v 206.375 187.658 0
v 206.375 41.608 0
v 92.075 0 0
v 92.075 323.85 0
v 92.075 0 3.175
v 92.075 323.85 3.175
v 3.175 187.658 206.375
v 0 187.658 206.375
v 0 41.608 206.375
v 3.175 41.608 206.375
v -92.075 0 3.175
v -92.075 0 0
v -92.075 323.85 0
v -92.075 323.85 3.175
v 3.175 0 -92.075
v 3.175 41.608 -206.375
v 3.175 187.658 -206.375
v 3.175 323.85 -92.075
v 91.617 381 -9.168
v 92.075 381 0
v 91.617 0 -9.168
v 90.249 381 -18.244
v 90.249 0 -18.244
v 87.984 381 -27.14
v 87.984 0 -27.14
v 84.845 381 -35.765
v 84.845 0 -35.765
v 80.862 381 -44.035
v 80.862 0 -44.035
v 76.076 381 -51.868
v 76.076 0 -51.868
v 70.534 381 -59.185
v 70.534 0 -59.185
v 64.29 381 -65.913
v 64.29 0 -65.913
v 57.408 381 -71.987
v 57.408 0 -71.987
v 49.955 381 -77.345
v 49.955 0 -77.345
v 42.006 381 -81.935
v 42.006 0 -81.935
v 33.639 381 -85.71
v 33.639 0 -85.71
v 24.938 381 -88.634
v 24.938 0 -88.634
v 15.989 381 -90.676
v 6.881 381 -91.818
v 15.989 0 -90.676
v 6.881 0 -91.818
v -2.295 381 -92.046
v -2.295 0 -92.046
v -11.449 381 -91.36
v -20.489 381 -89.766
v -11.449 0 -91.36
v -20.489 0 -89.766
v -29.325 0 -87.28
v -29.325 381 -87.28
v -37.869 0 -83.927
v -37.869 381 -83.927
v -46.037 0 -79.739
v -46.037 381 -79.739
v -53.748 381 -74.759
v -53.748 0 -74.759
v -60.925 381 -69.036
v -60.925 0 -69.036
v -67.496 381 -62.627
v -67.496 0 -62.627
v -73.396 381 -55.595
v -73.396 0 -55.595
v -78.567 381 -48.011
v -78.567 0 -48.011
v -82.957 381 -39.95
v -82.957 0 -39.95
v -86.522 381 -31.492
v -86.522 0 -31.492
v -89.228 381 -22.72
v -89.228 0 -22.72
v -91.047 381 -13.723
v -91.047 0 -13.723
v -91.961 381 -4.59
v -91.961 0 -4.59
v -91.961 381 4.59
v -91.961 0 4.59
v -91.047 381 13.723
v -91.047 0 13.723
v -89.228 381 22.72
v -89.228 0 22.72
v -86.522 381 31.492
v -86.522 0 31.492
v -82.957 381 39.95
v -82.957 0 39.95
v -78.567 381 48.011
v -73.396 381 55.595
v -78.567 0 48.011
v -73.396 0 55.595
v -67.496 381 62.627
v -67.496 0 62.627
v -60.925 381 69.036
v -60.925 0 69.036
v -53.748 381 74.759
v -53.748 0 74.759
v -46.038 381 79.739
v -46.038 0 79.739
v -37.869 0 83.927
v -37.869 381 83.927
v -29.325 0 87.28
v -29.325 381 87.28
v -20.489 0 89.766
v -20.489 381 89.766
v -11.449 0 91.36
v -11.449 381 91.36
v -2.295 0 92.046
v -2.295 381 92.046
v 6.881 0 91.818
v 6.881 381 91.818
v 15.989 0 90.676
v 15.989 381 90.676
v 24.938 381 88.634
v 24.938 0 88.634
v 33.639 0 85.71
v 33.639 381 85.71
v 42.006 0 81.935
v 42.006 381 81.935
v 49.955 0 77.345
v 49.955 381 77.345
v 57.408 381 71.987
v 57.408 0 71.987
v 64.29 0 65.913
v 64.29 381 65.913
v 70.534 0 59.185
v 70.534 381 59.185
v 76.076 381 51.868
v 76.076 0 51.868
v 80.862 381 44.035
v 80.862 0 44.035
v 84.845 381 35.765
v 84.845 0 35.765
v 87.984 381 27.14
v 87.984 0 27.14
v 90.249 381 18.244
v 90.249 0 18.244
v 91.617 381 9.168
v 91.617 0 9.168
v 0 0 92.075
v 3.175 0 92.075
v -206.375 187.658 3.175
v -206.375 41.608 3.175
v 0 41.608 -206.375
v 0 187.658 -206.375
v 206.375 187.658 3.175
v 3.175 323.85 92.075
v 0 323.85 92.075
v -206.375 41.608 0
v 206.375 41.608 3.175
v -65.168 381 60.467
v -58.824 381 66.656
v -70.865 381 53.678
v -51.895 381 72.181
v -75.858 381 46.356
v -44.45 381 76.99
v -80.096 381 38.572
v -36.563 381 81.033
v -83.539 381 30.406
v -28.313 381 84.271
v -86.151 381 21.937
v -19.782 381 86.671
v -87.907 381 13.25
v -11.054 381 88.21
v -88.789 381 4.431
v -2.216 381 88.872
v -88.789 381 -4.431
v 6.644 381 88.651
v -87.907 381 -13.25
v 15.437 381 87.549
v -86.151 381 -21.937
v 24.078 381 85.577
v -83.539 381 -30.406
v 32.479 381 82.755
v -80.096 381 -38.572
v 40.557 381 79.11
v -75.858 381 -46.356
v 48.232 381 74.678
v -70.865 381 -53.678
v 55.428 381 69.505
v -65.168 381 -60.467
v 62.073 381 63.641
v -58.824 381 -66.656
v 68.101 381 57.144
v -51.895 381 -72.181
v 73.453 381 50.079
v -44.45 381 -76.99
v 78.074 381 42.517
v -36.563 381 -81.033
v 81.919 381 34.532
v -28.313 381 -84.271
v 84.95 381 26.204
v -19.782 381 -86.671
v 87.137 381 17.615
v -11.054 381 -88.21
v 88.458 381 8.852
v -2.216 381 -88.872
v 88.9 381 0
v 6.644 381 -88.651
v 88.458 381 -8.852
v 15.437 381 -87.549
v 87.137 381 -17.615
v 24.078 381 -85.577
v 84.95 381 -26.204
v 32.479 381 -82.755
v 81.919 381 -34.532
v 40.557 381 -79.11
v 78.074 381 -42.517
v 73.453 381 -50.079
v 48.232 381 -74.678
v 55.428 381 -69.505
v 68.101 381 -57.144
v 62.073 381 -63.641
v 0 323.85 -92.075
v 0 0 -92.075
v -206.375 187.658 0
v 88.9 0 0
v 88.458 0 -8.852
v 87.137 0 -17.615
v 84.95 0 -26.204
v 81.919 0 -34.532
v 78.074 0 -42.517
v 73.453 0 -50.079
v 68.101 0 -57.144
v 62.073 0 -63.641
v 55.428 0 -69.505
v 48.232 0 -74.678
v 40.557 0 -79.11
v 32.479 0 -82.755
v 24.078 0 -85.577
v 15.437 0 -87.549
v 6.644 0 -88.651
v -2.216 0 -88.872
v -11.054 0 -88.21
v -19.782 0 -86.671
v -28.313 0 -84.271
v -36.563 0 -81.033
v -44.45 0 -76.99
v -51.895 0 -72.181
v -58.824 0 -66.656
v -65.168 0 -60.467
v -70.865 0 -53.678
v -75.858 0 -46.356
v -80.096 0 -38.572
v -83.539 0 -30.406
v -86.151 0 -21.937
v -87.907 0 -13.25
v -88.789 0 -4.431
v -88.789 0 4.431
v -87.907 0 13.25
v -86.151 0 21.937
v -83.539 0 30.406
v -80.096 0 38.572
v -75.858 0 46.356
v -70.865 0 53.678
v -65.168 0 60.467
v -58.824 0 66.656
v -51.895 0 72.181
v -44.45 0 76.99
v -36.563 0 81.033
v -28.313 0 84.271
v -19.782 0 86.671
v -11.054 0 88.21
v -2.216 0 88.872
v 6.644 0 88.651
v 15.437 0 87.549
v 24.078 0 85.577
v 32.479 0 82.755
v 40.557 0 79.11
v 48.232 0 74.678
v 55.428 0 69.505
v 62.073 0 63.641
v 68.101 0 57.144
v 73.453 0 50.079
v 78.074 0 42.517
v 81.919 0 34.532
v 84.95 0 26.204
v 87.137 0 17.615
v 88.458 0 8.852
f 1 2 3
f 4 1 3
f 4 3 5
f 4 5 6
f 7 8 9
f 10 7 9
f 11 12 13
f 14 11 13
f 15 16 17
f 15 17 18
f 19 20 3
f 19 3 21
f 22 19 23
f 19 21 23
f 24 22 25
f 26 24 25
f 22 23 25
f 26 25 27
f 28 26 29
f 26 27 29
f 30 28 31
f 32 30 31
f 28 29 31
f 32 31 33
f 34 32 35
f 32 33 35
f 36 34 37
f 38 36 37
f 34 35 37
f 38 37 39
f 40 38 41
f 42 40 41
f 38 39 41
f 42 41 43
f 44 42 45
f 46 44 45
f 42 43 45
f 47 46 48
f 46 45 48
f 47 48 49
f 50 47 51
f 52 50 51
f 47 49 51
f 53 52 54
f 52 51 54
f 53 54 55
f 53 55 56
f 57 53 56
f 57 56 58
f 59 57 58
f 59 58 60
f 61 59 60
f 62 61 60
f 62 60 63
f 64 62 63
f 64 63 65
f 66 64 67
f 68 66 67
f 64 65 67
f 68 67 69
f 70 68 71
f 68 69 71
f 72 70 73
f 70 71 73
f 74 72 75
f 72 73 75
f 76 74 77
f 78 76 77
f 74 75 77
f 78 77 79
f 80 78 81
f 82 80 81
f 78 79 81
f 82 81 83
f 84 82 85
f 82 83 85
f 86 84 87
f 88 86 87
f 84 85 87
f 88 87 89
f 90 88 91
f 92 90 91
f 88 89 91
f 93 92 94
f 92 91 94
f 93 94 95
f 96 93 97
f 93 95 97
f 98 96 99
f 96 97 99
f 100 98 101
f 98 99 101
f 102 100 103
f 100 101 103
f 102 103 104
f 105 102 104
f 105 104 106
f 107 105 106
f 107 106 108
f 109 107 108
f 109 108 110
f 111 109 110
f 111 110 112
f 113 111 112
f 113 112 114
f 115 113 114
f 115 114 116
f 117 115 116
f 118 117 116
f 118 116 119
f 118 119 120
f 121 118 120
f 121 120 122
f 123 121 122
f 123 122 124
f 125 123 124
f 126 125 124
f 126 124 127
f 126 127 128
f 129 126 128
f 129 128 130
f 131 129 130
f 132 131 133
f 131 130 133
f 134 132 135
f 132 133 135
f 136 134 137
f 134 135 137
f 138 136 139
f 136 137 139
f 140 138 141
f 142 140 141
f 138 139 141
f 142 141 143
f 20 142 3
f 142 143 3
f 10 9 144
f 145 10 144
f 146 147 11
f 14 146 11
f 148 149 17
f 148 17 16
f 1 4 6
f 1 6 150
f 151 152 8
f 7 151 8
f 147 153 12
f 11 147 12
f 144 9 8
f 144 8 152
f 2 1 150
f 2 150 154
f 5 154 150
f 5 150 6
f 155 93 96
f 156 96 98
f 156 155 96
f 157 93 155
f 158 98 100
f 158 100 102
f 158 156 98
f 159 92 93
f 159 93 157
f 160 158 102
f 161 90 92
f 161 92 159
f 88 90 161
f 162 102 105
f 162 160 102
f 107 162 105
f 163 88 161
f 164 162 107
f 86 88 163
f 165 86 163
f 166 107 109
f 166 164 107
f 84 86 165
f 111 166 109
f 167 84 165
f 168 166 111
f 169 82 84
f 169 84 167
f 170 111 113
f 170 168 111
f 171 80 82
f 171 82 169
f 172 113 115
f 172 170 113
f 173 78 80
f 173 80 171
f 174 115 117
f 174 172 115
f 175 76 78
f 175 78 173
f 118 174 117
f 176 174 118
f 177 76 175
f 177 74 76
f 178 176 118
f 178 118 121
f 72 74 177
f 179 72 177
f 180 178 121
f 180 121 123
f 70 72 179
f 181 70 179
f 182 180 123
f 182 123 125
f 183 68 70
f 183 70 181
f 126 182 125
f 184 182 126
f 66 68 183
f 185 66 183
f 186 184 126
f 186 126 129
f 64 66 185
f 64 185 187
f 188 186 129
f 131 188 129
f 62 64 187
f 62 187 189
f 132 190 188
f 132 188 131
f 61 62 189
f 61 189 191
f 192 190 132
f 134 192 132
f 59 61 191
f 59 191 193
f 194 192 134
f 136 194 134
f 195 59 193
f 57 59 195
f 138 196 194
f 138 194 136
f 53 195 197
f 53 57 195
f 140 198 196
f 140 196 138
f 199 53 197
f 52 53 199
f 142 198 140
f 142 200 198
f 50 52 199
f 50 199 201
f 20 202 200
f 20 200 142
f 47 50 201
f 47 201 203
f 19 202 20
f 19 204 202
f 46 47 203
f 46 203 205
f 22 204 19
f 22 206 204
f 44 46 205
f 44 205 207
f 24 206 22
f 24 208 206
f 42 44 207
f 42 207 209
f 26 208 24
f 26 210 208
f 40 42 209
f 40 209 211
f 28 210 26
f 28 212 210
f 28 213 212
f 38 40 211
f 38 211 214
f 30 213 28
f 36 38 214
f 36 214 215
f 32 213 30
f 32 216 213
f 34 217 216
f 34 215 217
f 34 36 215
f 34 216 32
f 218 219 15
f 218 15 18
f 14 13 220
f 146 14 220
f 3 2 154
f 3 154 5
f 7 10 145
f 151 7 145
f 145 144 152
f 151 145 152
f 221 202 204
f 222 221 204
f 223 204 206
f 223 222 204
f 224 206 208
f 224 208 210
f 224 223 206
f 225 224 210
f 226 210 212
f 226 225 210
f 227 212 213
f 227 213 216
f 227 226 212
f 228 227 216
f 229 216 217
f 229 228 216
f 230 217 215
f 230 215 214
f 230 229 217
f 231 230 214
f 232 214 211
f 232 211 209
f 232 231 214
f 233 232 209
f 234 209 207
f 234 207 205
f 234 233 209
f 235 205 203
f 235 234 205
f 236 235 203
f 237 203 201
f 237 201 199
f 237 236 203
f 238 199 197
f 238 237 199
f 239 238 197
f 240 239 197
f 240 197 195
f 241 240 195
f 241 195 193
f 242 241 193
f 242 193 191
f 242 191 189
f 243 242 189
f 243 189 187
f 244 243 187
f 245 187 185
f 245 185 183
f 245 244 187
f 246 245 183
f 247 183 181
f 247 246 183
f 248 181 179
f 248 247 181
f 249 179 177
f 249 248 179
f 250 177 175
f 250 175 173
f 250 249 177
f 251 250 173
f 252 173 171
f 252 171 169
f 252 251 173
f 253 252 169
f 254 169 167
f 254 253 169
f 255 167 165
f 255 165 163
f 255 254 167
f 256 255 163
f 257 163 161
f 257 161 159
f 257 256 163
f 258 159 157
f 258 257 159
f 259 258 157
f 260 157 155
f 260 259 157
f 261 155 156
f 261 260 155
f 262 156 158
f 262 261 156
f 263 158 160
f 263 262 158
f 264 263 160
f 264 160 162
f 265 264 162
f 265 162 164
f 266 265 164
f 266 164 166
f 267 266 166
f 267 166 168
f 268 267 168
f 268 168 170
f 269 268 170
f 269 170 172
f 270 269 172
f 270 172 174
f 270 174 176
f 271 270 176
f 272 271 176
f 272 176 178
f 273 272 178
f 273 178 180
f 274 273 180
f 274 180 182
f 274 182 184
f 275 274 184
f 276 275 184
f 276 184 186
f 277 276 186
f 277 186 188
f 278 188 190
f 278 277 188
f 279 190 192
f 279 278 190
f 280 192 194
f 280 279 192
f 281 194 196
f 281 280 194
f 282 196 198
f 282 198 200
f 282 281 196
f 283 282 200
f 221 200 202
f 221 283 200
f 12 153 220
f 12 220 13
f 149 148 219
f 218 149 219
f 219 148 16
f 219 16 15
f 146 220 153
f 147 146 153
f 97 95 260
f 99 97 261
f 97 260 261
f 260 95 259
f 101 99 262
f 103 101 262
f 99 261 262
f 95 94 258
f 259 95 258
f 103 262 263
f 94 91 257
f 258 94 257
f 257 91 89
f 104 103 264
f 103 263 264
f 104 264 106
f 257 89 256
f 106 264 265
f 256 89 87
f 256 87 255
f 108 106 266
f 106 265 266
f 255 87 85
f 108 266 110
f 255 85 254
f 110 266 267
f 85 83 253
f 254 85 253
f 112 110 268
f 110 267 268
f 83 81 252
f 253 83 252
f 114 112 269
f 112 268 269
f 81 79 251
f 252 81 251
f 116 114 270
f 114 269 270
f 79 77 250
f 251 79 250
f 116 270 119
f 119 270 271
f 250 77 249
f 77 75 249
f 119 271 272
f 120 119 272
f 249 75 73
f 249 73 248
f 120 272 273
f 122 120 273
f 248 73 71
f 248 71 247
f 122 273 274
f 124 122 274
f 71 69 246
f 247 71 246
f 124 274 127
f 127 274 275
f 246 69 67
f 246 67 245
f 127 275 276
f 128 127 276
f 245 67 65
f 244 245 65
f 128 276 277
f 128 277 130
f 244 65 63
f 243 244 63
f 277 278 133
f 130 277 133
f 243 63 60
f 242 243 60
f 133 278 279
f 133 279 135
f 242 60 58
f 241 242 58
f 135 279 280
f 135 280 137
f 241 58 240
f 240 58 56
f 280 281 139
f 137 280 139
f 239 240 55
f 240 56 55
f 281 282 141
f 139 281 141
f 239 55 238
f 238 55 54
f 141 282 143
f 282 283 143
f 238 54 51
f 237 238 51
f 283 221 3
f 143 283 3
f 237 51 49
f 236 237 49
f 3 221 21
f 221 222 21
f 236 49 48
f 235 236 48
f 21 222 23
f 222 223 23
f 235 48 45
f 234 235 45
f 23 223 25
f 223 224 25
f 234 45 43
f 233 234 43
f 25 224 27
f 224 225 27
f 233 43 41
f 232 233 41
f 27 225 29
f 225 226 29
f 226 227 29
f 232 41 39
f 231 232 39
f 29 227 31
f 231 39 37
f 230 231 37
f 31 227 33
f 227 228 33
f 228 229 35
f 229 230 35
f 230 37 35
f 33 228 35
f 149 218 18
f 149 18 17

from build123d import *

# Parameters (mm, degrees)
SKETCH1_R           = 92.075
SKETCH1_R_2         = 88.9
BOSS_EXTRUDE1_DEPTH = 381
BOSS_EXTRUDE2_DEPTH = 3.175
BOSS_EXTRUDE3_DEPTH = 3.175
BOSS_EXTRUDE4_DEPTH = 3.175
BOSS_EXTRUDE5_DEPTH = 3.175


with BuildPart() as part:
    # Sketch1 → Boss-Extrude1 (new body)
    with BuildSketch(Plane(origin=(0, 0, 0), x_dir=(1, 0, 0), z_dir=(0, 1, 0))):
        Circle(SKETCH1_R)
        Circle(SKETCH1_R_2, mode=Mode.SUBTRACT)
    extrude(amount=BOSS_EXTRUDE1_DEPTH)


with BuildPart() as body_2:
    # Sketch2 → Boss-Extrude2 (new body)
    with BuildSketch(Plane(origin=(0, 0, 0), x_dir=(0, 0, -1), z_dir=(1, 0, 0))):
        Polygon((-92.075, 323.85), (-206.375, 187.657672757), (-206.375, 41.607672757), (-92.075, 0), align=None)
    extrude(amount=BOSS_EXTRUDE2_DEPTH)


with BuildPart() as body_3:
    # Sketch5 → Boss-Extrude3 (new body)
    with BuildSketch(Plane(origin=(0, 0, 0), x_dir=(0, 0, -1), z_dir=(1, 0, 0))):
        Polygon((92.075, 323.85), (206.375, 187.657672757), (206.375, 41.607672757), (92.075, 0), align=None)
    extrude(amount=BOSS_EXTRUDE3_DEPTH)


with BuildPart() as body_4:
    # Sketch6 → Boss-Extrude4 (new body)
    with BuildSketch(Plane.XY):
        Polygon((-92.075, 323.85), (-206.375, 187.657672757), (-206.375, 41.607672757), (-92.075, 0), align=None)
    extrude(amount=BOSS_EXTRUDE4_DEPTH)


with BuildPart() as body_5:
    # Sketch7 → Boss-Extrude5 (new body)
    with BuildSketch(Plane.XY):
        Polygon((92.075, 323.85), (206.375, 187.657672757), (206.375, 41.607672757), (92.075, 0), align=None)
    extrude(amount=BOSS_EXTRUDE5_DEPTH)


solid = Compound([part.part, body_2.part, body_3.part, body_4.part, body_5.part])
